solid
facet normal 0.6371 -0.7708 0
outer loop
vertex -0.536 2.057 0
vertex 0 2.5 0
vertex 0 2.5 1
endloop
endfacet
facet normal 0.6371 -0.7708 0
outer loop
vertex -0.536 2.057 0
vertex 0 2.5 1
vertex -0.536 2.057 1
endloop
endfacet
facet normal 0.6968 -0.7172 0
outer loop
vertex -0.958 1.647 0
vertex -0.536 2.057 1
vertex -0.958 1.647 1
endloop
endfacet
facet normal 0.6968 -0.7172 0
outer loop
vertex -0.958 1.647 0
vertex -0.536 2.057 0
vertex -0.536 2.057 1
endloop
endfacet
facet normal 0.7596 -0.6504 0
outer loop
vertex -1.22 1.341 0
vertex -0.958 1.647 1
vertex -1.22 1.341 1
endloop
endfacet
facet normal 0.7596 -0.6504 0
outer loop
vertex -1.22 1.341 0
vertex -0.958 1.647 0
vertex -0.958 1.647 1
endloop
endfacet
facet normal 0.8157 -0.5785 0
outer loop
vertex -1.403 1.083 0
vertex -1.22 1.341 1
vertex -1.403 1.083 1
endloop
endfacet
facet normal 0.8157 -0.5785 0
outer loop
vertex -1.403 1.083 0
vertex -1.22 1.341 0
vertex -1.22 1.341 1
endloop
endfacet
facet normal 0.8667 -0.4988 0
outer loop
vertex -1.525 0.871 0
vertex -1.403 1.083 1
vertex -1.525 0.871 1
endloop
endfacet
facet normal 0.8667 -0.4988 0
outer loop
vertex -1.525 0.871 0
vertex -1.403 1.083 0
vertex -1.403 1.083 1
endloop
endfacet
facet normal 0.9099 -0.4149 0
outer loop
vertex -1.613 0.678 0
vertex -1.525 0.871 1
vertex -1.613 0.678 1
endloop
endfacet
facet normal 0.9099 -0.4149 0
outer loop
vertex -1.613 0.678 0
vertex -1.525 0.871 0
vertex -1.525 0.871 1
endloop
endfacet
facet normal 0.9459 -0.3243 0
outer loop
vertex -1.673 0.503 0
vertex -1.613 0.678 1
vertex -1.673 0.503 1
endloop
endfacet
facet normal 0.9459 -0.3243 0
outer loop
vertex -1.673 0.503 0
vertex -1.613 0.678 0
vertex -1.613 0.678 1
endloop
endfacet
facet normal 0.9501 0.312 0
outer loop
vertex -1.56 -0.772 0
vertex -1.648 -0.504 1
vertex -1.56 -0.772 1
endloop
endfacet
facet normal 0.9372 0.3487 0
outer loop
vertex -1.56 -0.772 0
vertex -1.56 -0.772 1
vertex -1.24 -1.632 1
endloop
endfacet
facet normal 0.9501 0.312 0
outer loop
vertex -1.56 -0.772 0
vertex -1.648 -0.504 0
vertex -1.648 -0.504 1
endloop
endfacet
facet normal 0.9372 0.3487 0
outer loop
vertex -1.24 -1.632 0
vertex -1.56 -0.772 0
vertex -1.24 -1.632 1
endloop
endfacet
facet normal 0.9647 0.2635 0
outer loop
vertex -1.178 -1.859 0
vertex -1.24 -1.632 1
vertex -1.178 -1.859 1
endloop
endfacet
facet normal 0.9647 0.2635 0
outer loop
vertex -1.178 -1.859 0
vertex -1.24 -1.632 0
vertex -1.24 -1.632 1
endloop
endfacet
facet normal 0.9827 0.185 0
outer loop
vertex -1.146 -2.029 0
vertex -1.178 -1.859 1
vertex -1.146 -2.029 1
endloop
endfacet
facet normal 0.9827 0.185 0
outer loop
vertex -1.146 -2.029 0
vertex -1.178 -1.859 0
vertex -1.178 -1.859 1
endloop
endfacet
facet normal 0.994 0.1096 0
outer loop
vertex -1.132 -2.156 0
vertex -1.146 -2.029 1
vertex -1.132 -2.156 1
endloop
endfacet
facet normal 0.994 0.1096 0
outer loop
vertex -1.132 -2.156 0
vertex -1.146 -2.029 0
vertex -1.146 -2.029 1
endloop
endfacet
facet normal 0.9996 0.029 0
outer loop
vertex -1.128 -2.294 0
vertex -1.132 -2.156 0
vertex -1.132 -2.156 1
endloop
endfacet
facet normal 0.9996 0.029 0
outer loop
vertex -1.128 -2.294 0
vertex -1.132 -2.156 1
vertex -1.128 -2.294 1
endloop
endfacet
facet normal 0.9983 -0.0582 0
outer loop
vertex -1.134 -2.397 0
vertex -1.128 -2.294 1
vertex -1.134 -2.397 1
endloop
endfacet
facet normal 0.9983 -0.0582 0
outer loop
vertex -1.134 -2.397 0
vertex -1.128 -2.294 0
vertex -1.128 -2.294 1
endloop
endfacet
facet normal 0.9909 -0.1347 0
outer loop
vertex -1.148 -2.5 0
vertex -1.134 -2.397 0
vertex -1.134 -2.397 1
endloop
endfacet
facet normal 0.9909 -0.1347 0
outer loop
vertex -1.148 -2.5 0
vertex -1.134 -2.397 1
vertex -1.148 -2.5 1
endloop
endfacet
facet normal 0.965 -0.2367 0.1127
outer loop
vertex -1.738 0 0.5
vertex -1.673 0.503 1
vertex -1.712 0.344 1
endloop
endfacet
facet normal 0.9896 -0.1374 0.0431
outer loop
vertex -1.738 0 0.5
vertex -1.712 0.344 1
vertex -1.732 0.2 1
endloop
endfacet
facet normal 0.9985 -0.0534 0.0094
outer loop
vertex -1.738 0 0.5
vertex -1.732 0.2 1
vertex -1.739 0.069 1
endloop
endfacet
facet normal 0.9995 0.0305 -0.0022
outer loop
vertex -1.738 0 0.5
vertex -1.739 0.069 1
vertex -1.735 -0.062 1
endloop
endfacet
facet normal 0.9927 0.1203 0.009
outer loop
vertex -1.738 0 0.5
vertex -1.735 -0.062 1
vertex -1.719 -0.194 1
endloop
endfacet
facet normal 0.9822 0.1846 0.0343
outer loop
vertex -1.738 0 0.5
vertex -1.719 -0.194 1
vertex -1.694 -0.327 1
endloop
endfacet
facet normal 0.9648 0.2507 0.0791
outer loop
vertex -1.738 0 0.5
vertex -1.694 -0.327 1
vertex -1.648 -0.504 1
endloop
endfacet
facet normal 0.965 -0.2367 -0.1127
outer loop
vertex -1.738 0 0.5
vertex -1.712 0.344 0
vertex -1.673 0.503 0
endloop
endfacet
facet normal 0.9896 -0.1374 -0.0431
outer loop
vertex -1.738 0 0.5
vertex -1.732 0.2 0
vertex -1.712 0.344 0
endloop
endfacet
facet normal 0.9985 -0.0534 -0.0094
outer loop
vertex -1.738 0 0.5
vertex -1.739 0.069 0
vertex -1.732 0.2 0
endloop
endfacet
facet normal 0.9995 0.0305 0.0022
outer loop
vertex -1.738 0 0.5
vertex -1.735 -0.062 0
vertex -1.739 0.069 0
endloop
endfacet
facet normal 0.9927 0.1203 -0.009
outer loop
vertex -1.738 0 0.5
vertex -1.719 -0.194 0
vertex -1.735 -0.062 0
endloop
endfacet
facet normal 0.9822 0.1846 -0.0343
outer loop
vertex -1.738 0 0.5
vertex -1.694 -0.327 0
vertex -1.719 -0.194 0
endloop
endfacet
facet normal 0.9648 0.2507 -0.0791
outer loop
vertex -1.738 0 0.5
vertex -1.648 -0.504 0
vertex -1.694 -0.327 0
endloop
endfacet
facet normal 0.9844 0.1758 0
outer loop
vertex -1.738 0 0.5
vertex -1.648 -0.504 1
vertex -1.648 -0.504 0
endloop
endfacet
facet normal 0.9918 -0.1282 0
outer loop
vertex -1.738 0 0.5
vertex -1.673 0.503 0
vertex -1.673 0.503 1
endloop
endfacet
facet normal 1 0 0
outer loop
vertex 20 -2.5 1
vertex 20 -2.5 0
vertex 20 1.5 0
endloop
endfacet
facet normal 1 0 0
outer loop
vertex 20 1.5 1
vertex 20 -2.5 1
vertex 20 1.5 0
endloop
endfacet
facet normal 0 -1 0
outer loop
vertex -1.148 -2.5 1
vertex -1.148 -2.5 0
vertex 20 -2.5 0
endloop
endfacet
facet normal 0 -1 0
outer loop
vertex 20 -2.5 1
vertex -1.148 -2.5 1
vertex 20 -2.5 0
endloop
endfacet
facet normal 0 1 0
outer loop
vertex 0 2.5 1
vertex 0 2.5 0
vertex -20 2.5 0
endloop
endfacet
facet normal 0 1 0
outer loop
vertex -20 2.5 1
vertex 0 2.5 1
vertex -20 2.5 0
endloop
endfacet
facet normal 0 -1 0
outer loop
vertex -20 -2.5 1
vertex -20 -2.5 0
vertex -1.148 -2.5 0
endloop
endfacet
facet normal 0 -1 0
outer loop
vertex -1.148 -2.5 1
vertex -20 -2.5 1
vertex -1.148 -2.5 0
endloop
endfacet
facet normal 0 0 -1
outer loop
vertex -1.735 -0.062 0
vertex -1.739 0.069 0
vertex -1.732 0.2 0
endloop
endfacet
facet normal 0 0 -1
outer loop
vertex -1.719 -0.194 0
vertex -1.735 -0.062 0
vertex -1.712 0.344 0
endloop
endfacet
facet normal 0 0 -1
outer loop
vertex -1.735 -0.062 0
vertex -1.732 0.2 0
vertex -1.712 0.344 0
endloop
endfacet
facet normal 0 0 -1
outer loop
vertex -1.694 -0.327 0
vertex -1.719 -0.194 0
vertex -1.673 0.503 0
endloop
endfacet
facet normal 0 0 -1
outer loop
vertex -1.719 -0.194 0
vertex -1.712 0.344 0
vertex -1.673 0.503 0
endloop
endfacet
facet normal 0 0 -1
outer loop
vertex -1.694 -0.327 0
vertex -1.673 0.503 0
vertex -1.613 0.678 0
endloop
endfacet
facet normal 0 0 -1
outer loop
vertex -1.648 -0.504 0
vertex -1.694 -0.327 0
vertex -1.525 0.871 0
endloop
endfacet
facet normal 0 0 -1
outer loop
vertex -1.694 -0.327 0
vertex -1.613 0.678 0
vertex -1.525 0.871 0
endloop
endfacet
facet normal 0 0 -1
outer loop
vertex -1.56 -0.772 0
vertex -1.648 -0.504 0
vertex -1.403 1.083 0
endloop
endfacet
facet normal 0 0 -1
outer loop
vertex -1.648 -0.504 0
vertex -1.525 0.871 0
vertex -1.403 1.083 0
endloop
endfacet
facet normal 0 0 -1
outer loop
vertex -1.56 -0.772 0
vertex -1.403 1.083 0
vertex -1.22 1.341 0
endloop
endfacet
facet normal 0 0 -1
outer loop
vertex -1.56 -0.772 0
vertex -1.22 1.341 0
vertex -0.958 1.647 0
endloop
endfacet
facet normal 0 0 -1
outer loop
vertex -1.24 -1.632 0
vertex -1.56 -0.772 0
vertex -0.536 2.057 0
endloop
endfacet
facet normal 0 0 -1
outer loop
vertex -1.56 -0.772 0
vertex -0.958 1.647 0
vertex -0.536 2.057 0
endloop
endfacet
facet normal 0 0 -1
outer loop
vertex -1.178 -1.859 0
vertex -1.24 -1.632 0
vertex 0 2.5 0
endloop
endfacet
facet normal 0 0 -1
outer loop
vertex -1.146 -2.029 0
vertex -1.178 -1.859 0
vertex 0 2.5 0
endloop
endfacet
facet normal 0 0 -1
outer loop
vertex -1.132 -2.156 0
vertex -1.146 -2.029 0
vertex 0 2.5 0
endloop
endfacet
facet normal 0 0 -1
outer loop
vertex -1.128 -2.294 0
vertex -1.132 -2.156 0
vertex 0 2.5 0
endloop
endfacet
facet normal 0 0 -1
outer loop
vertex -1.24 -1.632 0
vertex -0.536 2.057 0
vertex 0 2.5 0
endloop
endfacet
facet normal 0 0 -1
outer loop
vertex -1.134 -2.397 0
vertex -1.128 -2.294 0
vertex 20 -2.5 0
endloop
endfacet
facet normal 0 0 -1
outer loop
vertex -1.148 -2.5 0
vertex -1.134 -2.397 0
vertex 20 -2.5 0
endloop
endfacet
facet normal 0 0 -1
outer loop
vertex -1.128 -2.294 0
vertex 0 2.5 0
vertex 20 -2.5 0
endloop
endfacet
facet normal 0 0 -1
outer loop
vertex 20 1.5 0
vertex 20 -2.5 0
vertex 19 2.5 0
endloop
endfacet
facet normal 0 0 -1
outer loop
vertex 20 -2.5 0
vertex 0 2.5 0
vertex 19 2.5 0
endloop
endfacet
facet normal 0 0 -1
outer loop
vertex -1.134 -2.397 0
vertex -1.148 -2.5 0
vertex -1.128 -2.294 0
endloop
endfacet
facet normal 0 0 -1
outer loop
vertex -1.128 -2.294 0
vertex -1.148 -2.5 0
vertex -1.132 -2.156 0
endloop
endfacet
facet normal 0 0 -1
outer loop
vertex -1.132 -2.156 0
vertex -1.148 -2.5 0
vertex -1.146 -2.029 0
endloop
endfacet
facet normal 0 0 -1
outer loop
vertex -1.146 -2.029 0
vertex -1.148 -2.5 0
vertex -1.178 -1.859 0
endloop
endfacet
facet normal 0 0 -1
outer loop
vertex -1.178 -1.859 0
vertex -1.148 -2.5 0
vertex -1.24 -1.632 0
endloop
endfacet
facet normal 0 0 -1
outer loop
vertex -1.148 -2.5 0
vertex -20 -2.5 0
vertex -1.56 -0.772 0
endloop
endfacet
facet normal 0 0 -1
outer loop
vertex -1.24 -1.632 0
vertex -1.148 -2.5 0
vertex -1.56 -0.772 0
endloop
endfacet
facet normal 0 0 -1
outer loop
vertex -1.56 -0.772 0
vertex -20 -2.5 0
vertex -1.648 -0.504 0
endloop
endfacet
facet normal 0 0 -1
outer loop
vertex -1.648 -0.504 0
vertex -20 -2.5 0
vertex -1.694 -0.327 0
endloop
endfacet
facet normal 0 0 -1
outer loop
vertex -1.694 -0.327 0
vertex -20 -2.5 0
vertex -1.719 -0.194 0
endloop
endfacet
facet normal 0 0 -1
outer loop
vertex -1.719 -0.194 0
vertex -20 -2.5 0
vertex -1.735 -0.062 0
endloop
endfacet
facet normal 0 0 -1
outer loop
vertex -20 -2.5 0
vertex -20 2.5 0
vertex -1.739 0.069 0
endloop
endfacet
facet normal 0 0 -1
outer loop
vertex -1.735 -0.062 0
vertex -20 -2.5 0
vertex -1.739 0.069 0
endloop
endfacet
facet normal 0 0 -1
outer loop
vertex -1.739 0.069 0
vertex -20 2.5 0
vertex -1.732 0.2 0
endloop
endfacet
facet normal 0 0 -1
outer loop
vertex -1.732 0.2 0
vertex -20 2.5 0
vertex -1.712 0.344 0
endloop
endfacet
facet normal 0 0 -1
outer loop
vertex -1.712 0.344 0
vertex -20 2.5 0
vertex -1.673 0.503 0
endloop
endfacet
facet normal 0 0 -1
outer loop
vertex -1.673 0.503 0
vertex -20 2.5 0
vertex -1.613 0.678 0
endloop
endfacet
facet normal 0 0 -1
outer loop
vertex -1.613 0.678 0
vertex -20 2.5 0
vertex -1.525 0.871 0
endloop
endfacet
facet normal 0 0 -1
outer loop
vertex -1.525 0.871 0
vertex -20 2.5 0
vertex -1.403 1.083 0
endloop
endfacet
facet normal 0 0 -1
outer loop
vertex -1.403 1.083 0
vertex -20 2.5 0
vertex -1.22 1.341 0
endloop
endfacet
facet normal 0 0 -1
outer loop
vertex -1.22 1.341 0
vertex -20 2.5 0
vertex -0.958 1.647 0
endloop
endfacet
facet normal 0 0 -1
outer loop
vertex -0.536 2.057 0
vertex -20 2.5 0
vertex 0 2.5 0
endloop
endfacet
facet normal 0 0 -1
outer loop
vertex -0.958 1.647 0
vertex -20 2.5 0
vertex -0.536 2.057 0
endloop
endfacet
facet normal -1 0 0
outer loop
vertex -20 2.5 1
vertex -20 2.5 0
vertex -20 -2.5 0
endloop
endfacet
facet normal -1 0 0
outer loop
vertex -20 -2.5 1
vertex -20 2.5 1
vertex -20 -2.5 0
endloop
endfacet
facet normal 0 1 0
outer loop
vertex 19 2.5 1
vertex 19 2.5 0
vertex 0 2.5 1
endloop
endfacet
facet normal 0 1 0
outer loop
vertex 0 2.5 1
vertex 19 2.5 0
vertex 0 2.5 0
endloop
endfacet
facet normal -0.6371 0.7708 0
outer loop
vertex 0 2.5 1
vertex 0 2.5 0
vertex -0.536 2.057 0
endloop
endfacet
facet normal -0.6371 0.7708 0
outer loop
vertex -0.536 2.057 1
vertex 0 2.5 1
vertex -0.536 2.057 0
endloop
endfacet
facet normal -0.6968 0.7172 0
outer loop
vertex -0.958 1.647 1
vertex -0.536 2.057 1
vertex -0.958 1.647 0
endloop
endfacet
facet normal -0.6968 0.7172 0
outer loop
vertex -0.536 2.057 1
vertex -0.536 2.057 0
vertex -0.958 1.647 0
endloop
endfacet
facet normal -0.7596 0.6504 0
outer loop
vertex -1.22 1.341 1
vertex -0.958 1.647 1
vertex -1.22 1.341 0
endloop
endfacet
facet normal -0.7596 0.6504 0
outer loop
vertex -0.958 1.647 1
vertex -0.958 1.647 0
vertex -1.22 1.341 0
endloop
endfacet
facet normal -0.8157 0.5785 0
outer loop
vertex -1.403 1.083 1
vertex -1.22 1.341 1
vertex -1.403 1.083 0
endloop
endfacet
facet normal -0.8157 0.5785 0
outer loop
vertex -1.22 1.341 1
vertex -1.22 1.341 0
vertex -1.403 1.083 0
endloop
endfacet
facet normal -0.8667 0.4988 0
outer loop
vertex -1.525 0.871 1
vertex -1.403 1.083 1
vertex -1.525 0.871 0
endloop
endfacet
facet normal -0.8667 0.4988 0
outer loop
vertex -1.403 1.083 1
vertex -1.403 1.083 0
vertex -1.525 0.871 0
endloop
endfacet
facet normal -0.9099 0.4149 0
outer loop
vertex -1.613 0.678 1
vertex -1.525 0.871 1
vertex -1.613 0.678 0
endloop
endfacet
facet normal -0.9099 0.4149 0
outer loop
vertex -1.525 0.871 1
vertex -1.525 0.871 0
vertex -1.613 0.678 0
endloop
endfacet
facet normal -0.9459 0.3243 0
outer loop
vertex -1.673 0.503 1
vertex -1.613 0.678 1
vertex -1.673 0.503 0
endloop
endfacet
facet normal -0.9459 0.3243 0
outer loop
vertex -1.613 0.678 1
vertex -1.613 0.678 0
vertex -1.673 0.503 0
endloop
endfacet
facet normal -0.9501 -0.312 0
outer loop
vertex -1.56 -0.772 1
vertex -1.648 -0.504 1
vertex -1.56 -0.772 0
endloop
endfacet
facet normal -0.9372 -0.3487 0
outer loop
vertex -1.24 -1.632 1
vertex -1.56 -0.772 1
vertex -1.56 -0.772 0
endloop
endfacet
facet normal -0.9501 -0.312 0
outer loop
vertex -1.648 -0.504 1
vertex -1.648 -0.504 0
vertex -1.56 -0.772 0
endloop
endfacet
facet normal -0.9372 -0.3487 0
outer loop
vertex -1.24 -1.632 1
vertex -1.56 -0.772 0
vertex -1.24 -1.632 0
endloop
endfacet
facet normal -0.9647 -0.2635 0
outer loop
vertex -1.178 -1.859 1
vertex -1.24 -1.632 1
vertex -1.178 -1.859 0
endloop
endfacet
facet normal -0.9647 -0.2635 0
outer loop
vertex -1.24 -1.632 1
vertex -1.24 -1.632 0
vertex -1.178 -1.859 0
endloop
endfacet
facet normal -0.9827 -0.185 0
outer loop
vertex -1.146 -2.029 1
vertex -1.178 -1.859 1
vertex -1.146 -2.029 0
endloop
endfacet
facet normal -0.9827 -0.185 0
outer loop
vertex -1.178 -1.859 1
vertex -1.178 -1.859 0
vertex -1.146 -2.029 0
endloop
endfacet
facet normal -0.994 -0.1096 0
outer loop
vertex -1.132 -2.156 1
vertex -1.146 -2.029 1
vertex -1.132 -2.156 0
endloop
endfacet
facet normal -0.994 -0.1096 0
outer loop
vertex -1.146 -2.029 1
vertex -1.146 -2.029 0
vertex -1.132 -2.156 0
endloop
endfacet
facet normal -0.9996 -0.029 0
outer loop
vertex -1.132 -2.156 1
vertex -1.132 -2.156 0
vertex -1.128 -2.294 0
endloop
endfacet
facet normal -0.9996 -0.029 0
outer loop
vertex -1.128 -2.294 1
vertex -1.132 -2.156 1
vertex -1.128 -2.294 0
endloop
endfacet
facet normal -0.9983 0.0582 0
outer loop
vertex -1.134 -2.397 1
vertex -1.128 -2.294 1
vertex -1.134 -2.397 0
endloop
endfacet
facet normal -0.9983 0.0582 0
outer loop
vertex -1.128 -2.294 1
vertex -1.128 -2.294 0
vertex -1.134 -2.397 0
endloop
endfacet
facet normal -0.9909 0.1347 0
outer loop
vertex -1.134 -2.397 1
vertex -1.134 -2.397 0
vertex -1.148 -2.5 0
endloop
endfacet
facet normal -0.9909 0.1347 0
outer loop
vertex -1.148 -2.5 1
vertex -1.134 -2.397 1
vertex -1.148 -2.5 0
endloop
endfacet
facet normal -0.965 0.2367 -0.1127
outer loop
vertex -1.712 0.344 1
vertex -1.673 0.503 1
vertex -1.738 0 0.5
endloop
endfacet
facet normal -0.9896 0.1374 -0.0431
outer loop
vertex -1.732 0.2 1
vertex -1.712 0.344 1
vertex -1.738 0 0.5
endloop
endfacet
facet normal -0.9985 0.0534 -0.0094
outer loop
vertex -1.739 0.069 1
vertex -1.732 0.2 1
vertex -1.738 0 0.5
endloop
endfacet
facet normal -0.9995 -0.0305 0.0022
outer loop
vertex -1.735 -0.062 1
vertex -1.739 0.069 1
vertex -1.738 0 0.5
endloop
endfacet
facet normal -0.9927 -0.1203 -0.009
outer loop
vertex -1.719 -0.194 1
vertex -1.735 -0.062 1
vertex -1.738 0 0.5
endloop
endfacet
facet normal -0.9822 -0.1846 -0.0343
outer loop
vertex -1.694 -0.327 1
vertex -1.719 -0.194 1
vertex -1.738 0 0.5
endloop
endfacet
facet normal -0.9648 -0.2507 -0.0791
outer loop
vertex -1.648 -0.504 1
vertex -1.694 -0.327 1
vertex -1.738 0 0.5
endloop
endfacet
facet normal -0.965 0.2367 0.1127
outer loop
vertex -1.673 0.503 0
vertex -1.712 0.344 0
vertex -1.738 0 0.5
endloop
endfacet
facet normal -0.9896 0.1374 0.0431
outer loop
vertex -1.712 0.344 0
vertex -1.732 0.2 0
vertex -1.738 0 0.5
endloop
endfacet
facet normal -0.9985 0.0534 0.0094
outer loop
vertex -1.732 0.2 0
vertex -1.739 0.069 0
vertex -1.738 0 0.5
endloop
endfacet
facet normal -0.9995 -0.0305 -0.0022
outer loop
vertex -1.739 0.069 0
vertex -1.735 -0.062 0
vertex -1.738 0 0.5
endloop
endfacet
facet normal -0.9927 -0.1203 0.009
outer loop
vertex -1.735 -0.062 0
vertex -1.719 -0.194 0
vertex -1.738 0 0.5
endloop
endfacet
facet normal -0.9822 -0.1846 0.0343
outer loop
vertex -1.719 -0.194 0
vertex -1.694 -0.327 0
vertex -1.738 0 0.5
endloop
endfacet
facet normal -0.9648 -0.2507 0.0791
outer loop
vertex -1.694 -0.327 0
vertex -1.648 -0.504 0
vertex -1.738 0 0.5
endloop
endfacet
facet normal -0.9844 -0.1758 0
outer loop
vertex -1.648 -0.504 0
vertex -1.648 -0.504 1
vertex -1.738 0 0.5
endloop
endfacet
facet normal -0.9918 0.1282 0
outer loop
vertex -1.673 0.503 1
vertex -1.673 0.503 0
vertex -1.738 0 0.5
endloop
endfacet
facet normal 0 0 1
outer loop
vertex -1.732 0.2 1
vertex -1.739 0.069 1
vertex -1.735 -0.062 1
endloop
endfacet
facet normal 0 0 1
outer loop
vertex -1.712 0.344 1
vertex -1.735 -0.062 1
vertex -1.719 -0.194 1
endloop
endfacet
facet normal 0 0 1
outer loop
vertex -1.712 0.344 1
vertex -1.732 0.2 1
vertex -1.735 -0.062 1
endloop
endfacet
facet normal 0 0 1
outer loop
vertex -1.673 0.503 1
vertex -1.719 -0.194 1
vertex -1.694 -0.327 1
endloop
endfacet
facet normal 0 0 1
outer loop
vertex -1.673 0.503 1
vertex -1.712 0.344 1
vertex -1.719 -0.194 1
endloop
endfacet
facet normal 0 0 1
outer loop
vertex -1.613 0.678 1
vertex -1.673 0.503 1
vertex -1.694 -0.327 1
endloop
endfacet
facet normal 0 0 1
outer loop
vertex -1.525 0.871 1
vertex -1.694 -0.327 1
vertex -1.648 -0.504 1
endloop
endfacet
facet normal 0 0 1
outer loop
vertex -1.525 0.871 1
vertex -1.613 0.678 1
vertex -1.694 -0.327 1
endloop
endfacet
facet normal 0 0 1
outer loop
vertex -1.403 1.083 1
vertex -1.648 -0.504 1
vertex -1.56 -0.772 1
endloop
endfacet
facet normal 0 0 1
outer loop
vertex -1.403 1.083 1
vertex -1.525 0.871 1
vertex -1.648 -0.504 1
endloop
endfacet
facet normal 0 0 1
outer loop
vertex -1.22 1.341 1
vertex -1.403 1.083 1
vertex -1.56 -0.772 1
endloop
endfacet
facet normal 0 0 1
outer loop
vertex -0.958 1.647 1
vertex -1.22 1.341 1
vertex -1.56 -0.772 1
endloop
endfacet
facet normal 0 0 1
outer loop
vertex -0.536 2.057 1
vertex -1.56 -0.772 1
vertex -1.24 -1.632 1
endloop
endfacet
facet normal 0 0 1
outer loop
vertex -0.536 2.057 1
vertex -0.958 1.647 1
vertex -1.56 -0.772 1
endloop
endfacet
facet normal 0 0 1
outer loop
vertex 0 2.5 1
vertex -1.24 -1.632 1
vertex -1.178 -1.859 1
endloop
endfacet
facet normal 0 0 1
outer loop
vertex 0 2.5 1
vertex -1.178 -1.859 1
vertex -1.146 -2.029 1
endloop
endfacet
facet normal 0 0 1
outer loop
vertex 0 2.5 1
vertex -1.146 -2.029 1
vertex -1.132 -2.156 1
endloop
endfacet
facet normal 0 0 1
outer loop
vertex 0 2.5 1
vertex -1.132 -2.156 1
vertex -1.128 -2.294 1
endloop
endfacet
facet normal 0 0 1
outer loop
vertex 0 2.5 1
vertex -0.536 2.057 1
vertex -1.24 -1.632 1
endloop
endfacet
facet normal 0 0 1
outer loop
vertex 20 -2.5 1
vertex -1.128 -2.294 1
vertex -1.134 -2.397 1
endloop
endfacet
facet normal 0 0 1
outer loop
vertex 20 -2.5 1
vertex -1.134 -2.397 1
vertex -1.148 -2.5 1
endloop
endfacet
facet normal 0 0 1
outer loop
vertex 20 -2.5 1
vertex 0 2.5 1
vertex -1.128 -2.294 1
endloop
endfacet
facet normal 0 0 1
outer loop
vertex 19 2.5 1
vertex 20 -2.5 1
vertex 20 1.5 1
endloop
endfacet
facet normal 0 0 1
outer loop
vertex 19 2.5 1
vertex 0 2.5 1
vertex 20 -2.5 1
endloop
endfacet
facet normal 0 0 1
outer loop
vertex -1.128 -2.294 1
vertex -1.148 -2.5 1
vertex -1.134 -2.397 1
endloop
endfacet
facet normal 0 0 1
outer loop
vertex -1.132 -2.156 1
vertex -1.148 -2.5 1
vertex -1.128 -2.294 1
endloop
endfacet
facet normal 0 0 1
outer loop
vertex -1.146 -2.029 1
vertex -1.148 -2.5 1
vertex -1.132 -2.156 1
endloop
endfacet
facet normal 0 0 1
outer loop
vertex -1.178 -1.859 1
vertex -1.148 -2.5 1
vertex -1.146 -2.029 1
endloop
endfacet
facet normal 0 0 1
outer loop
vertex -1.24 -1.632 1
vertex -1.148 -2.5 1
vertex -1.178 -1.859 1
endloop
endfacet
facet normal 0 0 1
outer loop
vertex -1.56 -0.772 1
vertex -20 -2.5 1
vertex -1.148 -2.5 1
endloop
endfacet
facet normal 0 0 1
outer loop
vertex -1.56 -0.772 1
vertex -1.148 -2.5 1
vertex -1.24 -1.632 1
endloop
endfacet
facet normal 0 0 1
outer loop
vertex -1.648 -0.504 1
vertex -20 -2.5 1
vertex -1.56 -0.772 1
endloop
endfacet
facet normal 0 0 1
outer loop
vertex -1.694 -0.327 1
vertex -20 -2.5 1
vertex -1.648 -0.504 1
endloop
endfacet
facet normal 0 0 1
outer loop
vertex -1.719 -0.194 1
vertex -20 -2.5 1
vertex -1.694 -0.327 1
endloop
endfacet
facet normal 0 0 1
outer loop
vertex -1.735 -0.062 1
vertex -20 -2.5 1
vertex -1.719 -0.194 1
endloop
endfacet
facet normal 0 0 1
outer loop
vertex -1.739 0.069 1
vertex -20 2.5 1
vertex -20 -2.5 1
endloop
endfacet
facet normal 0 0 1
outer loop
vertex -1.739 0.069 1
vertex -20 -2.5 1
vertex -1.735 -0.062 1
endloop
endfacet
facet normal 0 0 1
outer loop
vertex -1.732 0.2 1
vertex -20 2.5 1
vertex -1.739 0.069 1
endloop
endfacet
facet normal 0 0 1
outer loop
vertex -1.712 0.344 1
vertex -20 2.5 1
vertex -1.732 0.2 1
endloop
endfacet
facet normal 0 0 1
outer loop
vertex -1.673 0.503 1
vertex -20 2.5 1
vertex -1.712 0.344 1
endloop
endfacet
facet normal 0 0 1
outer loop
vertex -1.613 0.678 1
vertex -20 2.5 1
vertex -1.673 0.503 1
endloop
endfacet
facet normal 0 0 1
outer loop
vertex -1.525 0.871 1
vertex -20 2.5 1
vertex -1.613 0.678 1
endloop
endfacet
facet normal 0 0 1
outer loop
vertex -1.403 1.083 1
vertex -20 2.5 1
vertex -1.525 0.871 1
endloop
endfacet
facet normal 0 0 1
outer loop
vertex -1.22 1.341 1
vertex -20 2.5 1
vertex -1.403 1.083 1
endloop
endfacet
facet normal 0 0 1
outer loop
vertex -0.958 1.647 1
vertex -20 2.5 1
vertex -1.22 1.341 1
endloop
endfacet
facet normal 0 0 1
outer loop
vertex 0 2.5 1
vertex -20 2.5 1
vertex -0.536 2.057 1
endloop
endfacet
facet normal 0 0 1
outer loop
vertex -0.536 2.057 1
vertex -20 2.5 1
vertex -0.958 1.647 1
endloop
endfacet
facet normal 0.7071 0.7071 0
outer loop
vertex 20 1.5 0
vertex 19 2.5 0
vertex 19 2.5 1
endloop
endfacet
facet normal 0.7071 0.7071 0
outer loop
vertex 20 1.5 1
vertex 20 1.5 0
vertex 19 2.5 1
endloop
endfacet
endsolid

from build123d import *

# Parameters (mm, degrees)
F1_DEPTH = 1
F2_DEPTH = 1
F3_SIZE  = 1


with BuildPart() as f1:
    # F0 (on Top) → F1 (new body)
    with BuildSketch(Plane.XY):
        with BuildLine():
            Line((-20, -2.5), (-1.1477398475, -2.5))
            add(Edge.make_bspline(
                [(0, 2.5), (-1, 1.7263505199), (-2.4792103177, 0.1212219451), (-1, -1.6790880909), (-1.1477398475, -2.5)],
                knots=[0, 0, 0, 0, 0.5212420535, 1, 1, 1, 1], degree=3))
            Line((0, 2.5), (-20, 2.5))
            Line((-20, 2.5), (-20, -2.5))
        make_face()
    extrude(amount=F1_DEPTH)


with BuildPart() as f2:
    # F0 (on Top) → F2 (new body)
    with BuildSketch(Plane.XY):
        with BuildLine():
            Line((-1.1477398475, -2.5), (20, -2.5))
            Line((20, -2.5), (20, 2.5))
            Line((20, 2.5), (0, 2.5))
            add(Edge.make_bspline(
                [(0, 2.5), (-1, 1.7263505199), (-2.4792103177, 0.1212219451), (-1, -1.6790880909), (-1.1477398475, -2.5)],
                knots=[0, 0, 0, 0, 0.5212420535, 1, 1, 1, 1], degree=3))
        make_face()
    extrude(amount=F2_DEPTH)

    # F3
    f3_edges = [f2.edges().sort_by_distance(p)[0] for p in [
        (20, 2.5, 0.5),
    ]]
    chamfer(f3_edges, length=F3_SIZE)


solid = Compound([f1.part, f2.part])
